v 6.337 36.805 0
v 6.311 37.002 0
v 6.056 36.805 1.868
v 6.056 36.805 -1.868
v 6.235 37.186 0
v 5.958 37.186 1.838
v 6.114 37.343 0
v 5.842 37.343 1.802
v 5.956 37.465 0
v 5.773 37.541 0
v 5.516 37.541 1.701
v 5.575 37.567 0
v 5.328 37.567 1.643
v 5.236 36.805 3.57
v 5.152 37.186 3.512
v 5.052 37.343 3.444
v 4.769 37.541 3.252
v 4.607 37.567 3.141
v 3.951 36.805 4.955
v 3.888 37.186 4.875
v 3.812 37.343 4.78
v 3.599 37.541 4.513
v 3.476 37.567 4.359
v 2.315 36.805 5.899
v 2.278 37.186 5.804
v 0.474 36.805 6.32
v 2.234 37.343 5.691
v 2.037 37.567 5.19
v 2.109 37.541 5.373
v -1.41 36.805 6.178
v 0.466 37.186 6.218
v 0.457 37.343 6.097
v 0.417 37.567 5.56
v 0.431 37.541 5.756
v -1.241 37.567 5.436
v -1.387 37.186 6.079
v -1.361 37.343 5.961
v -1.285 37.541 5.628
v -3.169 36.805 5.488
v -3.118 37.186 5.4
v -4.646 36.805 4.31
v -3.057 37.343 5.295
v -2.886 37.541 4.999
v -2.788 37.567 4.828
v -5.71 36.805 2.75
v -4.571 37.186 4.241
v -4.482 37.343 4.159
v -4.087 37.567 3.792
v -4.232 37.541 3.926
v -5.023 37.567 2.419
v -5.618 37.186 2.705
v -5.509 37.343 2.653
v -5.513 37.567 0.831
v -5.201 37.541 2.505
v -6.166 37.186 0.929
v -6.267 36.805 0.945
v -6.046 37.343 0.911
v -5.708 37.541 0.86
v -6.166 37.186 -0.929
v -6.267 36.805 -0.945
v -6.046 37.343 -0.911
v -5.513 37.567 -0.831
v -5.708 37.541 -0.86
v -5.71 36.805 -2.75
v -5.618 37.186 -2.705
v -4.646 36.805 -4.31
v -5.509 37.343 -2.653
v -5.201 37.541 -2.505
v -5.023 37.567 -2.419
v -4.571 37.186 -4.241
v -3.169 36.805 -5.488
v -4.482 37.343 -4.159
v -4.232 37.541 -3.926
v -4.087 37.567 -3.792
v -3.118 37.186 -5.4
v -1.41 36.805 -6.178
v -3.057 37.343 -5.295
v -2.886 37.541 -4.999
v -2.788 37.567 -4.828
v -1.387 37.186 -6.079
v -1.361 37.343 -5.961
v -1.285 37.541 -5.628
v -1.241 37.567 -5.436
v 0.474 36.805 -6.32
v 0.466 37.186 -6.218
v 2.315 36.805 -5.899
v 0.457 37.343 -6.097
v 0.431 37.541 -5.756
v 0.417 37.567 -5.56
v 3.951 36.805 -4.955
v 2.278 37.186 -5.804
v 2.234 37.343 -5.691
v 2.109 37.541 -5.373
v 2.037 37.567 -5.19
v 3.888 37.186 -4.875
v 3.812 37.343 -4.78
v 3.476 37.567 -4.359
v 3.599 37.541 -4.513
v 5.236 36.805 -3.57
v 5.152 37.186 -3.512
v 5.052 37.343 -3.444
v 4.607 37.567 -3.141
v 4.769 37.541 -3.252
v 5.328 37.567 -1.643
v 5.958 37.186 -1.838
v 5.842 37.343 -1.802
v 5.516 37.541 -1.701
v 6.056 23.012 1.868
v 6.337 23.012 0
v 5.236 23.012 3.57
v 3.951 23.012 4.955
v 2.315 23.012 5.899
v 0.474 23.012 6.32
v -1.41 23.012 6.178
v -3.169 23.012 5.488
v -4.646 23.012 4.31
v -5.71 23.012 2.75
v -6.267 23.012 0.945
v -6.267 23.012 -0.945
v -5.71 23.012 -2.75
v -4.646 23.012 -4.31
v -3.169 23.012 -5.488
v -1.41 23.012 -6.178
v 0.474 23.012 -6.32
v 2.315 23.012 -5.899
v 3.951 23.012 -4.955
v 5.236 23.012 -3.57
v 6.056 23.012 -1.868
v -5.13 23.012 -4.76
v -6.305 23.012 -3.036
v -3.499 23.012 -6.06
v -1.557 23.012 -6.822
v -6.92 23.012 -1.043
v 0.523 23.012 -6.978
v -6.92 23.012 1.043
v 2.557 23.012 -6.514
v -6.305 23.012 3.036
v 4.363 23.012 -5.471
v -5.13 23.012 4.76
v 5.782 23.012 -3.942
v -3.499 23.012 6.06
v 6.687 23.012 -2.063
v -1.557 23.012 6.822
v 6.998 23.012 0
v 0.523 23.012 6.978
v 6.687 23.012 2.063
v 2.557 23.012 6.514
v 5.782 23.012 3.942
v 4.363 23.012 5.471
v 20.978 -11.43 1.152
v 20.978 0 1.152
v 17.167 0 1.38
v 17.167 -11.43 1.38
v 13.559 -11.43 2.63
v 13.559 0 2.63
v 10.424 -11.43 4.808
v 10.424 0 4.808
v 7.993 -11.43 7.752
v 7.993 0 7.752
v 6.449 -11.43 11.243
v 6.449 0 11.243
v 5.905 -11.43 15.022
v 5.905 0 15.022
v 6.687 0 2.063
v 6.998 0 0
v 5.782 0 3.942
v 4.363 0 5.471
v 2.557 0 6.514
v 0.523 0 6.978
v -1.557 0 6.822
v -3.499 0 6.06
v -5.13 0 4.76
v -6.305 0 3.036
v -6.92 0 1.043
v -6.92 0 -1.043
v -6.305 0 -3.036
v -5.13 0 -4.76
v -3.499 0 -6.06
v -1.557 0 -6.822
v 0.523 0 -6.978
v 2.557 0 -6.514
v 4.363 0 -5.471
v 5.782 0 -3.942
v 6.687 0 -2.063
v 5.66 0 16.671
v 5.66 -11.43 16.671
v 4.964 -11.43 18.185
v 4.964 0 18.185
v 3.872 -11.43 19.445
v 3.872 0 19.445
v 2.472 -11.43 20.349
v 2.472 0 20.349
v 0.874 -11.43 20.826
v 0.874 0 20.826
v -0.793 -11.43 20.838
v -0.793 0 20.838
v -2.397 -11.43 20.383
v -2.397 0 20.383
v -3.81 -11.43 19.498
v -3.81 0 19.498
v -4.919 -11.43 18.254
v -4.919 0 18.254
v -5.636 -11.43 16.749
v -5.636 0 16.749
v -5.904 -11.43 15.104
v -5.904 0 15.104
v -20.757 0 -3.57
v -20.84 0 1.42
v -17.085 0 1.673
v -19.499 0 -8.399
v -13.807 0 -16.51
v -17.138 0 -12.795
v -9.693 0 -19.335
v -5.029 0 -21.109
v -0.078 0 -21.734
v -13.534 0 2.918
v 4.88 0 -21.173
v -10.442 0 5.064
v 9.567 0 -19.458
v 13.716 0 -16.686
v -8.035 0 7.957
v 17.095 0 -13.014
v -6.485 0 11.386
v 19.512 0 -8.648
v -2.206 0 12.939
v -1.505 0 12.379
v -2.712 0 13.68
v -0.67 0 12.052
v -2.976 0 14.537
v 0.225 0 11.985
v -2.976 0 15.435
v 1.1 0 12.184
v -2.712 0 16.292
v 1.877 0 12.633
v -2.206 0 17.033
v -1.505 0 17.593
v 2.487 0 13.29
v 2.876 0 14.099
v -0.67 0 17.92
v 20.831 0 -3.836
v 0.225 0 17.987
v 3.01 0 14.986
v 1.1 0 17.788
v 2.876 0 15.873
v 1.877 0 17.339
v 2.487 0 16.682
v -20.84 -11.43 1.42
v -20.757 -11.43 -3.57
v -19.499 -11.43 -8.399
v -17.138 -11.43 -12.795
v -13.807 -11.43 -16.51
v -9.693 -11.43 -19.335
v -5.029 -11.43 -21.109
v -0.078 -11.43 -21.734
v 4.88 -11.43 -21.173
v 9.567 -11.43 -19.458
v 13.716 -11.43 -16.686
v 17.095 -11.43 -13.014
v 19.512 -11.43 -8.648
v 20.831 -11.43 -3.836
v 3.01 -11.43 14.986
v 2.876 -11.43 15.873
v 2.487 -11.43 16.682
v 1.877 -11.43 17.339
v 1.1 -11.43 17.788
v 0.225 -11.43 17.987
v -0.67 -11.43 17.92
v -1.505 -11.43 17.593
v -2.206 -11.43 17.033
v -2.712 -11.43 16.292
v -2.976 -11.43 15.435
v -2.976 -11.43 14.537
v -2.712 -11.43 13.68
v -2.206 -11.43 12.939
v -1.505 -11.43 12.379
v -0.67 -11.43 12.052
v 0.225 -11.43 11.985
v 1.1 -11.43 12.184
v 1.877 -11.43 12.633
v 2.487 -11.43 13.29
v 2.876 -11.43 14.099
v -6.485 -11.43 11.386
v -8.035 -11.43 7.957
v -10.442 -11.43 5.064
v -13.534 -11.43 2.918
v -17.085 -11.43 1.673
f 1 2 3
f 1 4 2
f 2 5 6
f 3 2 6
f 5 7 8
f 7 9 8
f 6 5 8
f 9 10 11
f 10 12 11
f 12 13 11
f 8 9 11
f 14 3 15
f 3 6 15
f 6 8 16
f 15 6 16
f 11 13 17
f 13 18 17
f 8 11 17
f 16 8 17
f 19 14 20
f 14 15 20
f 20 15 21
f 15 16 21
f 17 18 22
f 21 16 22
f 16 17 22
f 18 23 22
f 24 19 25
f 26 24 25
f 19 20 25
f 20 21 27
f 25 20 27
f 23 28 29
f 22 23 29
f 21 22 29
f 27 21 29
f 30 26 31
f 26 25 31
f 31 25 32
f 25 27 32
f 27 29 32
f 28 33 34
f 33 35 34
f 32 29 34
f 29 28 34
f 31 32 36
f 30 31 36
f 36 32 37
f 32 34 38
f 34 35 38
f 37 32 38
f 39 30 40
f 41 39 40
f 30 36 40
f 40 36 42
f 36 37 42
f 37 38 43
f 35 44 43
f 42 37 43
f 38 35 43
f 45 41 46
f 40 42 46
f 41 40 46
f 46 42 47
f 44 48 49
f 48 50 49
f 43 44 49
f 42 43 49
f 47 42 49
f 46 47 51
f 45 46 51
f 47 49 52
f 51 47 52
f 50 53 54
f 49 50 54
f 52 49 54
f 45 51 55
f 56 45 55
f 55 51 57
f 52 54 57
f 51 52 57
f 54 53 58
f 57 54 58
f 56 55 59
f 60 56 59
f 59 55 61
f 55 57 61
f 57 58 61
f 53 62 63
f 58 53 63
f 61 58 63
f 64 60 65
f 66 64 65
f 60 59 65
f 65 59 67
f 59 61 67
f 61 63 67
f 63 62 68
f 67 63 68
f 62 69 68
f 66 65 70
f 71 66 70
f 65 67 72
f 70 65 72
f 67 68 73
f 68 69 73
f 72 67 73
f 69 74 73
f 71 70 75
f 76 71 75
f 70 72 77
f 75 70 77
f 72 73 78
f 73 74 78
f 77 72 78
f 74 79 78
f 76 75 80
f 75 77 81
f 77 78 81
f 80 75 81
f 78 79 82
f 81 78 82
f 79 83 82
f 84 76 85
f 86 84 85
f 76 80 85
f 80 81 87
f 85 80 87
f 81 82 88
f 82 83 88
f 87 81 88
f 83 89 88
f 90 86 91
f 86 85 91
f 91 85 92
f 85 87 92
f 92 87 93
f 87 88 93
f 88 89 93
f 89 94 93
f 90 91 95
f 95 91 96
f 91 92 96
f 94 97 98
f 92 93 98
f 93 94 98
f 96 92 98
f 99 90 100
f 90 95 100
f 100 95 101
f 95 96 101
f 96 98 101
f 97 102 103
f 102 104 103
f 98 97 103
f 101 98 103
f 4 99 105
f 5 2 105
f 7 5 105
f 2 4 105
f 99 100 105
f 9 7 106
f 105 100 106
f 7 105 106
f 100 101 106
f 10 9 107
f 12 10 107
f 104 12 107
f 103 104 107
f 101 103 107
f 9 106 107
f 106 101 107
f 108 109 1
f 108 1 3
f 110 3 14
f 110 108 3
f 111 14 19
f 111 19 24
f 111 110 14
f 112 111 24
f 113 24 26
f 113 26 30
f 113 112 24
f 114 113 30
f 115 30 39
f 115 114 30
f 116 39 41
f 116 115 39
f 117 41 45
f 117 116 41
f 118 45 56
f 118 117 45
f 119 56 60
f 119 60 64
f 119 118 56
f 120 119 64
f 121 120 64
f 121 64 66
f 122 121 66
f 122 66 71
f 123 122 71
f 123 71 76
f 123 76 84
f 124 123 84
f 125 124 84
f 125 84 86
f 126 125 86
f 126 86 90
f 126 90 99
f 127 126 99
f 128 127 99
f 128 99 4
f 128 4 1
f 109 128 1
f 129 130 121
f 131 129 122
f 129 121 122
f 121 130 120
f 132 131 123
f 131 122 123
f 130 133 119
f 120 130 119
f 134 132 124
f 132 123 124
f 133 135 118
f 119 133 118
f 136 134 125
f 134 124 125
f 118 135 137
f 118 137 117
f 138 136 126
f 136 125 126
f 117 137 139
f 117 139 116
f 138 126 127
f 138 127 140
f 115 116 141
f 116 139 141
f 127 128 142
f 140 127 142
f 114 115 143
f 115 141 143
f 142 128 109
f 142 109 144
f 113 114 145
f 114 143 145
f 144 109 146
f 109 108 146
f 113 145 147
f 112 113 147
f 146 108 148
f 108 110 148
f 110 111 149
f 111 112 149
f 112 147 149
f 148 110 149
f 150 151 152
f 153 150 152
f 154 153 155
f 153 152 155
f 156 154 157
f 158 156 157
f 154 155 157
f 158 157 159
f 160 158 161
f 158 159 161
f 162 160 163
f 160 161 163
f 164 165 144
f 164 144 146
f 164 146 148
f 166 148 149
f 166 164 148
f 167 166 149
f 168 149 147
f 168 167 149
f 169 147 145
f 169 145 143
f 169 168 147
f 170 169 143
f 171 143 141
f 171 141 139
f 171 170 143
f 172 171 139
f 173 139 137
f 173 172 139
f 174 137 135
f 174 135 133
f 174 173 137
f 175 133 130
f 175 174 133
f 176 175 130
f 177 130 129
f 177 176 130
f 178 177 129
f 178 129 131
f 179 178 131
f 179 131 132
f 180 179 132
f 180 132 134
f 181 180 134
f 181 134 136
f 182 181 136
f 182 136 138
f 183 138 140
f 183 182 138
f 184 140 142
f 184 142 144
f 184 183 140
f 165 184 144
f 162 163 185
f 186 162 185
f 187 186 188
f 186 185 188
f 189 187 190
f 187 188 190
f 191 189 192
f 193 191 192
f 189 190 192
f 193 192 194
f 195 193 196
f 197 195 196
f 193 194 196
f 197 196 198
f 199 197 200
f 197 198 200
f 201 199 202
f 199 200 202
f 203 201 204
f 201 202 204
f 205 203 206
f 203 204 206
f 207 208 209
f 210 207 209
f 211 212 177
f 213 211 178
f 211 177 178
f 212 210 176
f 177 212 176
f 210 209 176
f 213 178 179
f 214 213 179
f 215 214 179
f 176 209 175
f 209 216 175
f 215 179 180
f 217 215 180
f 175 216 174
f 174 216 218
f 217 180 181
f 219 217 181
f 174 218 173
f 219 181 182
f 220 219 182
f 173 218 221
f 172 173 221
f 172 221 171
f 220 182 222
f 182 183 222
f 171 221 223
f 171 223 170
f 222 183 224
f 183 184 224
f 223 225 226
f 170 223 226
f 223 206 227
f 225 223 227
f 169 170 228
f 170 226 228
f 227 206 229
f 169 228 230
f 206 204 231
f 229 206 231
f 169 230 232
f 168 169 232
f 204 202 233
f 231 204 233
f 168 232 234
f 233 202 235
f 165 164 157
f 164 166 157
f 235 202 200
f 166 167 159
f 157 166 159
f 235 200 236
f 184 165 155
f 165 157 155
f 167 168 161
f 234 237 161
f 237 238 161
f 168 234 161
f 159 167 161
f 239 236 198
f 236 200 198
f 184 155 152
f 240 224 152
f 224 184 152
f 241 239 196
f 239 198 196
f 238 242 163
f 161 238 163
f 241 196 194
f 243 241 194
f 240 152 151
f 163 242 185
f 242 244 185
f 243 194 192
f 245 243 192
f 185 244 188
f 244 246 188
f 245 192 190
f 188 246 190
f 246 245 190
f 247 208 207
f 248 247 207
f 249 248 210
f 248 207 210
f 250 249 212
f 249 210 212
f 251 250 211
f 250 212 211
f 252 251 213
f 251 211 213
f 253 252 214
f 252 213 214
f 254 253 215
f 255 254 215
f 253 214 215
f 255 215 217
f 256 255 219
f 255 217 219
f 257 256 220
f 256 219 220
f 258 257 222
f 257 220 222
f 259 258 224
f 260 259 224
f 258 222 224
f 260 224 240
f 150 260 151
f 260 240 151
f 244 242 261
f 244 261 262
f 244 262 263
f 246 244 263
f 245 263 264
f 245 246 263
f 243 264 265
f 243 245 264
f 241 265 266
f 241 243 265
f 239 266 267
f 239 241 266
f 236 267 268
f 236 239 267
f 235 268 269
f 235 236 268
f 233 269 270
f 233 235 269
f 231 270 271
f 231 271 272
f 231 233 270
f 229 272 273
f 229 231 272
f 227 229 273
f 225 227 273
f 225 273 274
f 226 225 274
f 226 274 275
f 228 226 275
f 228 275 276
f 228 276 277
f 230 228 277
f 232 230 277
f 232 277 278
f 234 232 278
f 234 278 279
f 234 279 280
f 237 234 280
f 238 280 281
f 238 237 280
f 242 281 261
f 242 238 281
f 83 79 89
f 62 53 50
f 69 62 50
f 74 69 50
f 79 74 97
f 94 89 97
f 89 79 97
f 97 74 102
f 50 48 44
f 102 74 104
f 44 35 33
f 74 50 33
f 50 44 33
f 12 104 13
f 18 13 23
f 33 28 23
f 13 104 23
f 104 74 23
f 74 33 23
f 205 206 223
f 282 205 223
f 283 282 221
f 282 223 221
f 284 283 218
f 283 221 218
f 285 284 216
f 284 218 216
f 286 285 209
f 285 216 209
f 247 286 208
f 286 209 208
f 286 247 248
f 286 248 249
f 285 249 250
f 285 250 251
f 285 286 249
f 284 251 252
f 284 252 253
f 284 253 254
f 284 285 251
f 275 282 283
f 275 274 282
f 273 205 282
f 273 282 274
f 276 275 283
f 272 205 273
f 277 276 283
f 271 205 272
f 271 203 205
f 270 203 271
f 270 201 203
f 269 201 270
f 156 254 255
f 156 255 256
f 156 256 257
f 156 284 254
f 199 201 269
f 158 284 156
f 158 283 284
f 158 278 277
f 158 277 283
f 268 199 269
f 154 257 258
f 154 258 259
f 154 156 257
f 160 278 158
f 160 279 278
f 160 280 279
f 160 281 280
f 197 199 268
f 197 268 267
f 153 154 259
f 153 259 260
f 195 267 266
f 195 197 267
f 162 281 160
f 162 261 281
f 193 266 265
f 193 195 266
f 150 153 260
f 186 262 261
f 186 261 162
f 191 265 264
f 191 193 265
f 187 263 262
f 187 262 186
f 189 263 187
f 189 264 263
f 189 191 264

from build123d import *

# Parameters (mm, degrees)
F0_R     = 3.0099
F1_DEPTH = 11.43
F2_R     = 6.9977
F2_R_2   = 6.3373
F3_DEPTH = 23.0124
F4_DEPTH = 37.5666
F5_R     = 0.762


with BuildPart() as f1:
    # F0 (on Front) → F1 (new body)
    with BuildSketch(Plane.XZ):
        with BuildLine():
            ThreePointArc((20.977623, 1.152295), (10.42378, 4.807532), (5.905392, 15.021665))
            ThreePointArc((5.905392, 15.021665), (0.041118, 20.891357), (-5.904323, 15.103895))
            ThreePointArc((-5.904323, 15.103895), (-10.442291, 5.064331), (-20.839523, 1.41967))
            ThreePointArc((-20.839523, 1.41967), (-0.078135, -21.733629), (20.977623, 1.152295))
        make_face()
        with Locations((0, 14.986)):
            Circle(F0_R, mode=Mode.SUBTRACT)
    extrude(amount=F1_DEPTH)

    # F2 (on Front) → F3 (join)
    with BuildSketch(Plane.XZ):
        Circle(F2_R)
        Circle(F2_R_2, mode=Mode.SUBTRACT)
    extrude(amount=-F3_DEPTH)

    # F2 (on Front) → F4 (join)
    with BuildSketch(Plane.XZ):
        Circle(F2_R_2)
    extrude(amount=-F4_DEPTH)

    # F5
    f5_edges = [f1.edges().sort_by_distance(p)[0] for p in [
        (-6.3373, 37.5666, 0),
    ]]
    fillet(f5_edges, radius=F5_R)


solid = f1.part
